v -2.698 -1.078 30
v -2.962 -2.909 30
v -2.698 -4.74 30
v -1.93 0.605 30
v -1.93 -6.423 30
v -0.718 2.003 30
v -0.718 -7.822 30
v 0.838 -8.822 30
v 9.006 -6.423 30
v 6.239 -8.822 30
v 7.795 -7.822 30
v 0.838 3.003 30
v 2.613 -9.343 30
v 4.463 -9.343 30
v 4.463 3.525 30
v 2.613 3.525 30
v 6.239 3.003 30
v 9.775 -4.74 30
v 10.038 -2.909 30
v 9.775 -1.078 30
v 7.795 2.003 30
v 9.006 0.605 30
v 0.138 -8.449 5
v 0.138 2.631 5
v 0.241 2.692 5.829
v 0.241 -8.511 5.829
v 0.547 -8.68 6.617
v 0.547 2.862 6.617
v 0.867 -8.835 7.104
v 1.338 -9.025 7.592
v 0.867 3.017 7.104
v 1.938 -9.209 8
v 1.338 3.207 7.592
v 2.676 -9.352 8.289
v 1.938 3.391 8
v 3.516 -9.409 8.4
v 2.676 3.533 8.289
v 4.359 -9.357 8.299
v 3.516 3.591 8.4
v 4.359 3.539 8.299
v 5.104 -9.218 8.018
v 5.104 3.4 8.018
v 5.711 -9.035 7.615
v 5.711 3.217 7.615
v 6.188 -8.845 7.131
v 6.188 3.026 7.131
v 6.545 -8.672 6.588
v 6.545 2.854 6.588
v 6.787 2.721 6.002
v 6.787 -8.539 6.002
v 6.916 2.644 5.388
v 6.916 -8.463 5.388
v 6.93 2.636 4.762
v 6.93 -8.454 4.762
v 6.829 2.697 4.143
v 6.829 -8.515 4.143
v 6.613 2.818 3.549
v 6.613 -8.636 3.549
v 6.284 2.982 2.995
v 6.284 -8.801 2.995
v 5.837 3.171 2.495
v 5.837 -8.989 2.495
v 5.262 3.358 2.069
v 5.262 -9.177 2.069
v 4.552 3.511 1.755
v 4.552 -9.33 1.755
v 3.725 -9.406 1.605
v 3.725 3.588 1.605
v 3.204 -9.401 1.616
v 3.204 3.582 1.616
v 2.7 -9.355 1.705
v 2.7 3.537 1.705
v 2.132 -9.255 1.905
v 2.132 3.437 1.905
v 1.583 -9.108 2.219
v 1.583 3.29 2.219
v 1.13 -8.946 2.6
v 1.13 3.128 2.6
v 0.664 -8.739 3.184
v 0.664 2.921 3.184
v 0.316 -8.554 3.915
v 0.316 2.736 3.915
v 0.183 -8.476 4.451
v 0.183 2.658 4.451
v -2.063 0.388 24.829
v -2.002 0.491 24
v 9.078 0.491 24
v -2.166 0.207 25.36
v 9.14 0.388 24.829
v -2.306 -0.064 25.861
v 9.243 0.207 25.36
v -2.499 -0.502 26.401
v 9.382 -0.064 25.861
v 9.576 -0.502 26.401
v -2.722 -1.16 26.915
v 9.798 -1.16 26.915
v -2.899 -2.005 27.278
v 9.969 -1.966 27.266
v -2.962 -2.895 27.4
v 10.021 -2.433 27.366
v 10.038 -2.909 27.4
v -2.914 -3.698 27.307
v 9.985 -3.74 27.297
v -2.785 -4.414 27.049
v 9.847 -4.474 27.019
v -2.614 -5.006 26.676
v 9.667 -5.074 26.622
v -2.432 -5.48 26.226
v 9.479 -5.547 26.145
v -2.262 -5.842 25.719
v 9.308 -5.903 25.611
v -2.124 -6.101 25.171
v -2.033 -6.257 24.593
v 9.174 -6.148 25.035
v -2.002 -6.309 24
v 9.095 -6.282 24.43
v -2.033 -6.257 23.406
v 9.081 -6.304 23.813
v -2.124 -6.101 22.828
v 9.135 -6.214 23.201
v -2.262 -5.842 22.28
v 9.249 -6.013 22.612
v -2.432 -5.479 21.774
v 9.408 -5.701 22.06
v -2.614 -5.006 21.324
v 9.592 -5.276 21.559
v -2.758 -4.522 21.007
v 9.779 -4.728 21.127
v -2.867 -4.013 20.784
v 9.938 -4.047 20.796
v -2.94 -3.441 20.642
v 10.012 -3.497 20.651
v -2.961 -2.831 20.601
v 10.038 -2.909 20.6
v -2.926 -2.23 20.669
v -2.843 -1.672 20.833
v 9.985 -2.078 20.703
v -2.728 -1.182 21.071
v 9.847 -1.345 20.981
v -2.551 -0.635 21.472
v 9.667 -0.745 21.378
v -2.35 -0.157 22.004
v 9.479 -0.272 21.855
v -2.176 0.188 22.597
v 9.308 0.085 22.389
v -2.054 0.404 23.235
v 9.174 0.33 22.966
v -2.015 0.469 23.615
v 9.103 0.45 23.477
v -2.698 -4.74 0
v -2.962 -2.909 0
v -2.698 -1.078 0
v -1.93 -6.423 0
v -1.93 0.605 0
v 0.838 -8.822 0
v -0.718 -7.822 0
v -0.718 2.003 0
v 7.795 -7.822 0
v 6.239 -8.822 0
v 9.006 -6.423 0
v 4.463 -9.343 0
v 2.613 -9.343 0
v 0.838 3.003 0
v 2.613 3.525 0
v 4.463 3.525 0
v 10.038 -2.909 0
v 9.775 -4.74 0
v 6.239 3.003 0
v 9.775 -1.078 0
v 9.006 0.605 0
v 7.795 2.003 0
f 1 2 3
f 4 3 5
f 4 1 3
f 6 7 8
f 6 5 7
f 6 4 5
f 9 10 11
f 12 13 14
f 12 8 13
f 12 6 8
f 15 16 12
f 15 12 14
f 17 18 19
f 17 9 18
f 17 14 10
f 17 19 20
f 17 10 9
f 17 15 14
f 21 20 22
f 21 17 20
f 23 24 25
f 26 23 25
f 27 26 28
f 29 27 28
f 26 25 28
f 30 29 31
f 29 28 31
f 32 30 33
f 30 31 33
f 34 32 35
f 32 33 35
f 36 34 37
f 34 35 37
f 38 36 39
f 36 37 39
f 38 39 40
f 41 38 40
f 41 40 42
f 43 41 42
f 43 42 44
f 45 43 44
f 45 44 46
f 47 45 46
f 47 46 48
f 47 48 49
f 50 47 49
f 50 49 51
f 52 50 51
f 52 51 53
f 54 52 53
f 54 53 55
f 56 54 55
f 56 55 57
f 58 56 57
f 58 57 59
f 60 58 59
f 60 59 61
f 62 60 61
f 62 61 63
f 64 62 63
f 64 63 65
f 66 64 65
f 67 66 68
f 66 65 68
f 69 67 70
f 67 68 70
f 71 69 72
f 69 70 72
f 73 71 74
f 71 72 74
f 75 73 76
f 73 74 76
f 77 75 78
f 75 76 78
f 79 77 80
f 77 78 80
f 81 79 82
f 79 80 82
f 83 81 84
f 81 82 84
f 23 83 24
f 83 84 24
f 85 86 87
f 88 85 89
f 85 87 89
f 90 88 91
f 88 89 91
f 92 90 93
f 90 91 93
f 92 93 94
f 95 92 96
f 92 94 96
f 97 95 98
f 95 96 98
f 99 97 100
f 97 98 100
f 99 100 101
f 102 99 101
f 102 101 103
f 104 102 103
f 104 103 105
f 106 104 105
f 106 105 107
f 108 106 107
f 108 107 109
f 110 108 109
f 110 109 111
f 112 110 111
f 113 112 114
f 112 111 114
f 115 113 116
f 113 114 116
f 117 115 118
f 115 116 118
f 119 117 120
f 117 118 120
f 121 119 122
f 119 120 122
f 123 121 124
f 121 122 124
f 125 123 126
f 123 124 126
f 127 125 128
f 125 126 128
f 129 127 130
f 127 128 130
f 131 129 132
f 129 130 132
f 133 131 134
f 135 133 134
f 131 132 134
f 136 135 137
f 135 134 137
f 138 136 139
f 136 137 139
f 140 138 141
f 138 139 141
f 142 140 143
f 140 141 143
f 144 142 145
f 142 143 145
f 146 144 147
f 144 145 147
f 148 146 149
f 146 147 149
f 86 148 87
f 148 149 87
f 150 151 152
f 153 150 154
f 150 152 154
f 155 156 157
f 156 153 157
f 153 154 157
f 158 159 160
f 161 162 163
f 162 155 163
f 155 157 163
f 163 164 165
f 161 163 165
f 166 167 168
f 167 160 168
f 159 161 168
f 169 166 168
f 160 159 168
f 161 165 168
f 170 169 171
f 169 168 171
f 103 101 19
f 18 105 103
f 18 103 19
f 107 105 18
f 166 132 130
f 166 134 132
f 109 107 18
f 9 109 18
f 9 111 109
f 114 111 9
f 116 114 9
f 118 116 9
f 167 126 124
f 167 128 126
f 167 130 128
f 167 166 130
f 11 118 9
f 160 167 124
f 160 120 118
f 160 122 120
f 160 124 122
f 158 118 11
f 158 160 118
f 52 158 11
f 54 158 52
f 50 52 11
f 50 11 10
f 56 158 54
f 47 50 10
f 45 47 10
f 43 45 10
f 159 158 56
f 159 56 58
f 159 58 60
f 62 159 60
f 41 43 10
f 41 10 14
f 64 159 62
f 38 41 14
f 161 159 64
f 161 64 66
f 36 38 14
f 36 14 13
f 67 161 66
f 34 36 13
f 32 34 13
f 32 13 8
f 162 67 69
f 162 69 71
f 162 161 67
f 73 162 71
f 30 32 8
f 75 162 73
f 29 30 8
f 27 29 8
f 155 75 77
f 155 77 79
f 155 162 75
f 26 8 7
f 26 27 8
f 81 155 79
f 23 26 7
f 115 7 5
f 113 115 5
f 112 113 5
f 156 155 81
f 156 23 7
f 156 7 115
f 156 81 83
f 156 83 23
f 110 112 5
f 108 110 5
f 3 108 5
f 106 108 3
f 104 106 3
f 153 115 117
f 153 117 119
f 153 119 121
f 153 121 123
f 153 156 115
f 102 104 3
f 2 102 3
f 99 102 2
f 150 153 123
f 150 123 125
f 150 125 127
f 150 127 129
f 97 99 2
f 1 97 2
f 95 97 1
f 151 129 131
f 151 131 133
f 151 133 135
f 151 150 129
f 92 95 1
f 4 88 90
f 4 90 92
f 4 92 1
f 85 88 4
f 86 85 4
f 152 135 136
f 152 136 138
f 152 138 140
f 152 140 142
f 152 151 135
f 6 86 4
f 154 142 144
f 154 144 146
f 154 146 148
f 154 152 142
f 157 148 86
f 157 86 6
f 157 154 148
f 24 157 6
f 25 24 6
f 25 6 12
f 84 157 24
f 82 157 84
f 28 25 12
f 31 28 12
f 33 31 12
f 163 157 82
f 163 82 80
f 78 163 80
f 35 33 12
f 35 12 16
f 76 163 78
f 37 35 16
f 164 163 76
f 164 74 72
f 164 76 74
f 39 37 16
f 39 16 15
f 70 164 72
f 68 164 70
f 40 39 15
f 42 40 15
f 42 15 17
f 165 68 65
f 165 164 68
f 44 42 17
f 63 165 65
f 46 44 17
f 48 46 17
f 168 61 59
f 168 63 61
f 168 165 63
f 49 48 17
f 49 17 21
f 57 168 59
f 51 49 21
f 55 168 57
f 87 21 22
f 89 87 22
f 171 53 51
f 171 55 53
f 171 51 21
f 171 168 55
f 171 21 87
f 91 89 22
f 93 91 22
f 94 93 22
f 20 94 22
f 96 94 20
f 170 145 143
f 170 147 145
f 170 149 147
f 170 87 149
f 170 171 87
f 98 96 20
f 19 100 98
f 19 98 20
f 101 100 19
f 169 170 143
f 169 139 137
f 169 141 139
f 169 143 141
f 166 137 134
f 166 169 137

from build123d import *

# Parameters (mm, degrees)
F0_W     = 20
F0_H     = 20
F1_DEPTH = 30
F3_R     = 3.4
F4_DEPTH = 25
F2_R     = 3.4
F5_DEPTH = 25
F6_W     = 20
F6_H     = 20
F6_R     = 6.5
F7_DEPTH = 30


with BuildPart() as f1:
    # F0 (on Top) → F1 (new body)
    with BuildSketch(Plane.XY):
        with Locations((3.538307, -2.90917)):
            Rectangle(F0_W, F0_H)
    extrude(amount=F1_DEPTH)

    # F3 (on face) → F4 (cut)
    with BuildSketch(Plane.YZ.offset(13.538307)):
        with Locations((-2.90917, 24)):
            Circle(F3_R)
    extrude(amount=-F4_DEPTH, mode=Mode.SUBTRACT)

    # F2 (on face) → F5 (cut)
    with BuildSketch(Plane(origin=(0, 7.09083, 0), x_dir=(-1, 0, 0), z_dir=(0, 1, 0))):
        with Locations((-3.538307, 5)):
            Circle(F2_R)
    extrude(amount=-F5_DEPTH, mode=Mode.SUBTRACT)

    # F6 (on face) → F7 (cut)
    with BuildSketch(Plane(origin=(0, 0, 0), x_dir=(1, 0, 0), z_dir=(0, 0, -1))):
        with Locations((3.538307, 2.90917)):
            Rectangle(F6_W, F6_H)
        with Locations((3.538307, 2.90917)):
            Circle(F6_R, mode=Mode.SUBTRACT)
    extrude(amount=-F7_DEPTH, mode=Mode.SUBTRACT)


solid = f1.part
